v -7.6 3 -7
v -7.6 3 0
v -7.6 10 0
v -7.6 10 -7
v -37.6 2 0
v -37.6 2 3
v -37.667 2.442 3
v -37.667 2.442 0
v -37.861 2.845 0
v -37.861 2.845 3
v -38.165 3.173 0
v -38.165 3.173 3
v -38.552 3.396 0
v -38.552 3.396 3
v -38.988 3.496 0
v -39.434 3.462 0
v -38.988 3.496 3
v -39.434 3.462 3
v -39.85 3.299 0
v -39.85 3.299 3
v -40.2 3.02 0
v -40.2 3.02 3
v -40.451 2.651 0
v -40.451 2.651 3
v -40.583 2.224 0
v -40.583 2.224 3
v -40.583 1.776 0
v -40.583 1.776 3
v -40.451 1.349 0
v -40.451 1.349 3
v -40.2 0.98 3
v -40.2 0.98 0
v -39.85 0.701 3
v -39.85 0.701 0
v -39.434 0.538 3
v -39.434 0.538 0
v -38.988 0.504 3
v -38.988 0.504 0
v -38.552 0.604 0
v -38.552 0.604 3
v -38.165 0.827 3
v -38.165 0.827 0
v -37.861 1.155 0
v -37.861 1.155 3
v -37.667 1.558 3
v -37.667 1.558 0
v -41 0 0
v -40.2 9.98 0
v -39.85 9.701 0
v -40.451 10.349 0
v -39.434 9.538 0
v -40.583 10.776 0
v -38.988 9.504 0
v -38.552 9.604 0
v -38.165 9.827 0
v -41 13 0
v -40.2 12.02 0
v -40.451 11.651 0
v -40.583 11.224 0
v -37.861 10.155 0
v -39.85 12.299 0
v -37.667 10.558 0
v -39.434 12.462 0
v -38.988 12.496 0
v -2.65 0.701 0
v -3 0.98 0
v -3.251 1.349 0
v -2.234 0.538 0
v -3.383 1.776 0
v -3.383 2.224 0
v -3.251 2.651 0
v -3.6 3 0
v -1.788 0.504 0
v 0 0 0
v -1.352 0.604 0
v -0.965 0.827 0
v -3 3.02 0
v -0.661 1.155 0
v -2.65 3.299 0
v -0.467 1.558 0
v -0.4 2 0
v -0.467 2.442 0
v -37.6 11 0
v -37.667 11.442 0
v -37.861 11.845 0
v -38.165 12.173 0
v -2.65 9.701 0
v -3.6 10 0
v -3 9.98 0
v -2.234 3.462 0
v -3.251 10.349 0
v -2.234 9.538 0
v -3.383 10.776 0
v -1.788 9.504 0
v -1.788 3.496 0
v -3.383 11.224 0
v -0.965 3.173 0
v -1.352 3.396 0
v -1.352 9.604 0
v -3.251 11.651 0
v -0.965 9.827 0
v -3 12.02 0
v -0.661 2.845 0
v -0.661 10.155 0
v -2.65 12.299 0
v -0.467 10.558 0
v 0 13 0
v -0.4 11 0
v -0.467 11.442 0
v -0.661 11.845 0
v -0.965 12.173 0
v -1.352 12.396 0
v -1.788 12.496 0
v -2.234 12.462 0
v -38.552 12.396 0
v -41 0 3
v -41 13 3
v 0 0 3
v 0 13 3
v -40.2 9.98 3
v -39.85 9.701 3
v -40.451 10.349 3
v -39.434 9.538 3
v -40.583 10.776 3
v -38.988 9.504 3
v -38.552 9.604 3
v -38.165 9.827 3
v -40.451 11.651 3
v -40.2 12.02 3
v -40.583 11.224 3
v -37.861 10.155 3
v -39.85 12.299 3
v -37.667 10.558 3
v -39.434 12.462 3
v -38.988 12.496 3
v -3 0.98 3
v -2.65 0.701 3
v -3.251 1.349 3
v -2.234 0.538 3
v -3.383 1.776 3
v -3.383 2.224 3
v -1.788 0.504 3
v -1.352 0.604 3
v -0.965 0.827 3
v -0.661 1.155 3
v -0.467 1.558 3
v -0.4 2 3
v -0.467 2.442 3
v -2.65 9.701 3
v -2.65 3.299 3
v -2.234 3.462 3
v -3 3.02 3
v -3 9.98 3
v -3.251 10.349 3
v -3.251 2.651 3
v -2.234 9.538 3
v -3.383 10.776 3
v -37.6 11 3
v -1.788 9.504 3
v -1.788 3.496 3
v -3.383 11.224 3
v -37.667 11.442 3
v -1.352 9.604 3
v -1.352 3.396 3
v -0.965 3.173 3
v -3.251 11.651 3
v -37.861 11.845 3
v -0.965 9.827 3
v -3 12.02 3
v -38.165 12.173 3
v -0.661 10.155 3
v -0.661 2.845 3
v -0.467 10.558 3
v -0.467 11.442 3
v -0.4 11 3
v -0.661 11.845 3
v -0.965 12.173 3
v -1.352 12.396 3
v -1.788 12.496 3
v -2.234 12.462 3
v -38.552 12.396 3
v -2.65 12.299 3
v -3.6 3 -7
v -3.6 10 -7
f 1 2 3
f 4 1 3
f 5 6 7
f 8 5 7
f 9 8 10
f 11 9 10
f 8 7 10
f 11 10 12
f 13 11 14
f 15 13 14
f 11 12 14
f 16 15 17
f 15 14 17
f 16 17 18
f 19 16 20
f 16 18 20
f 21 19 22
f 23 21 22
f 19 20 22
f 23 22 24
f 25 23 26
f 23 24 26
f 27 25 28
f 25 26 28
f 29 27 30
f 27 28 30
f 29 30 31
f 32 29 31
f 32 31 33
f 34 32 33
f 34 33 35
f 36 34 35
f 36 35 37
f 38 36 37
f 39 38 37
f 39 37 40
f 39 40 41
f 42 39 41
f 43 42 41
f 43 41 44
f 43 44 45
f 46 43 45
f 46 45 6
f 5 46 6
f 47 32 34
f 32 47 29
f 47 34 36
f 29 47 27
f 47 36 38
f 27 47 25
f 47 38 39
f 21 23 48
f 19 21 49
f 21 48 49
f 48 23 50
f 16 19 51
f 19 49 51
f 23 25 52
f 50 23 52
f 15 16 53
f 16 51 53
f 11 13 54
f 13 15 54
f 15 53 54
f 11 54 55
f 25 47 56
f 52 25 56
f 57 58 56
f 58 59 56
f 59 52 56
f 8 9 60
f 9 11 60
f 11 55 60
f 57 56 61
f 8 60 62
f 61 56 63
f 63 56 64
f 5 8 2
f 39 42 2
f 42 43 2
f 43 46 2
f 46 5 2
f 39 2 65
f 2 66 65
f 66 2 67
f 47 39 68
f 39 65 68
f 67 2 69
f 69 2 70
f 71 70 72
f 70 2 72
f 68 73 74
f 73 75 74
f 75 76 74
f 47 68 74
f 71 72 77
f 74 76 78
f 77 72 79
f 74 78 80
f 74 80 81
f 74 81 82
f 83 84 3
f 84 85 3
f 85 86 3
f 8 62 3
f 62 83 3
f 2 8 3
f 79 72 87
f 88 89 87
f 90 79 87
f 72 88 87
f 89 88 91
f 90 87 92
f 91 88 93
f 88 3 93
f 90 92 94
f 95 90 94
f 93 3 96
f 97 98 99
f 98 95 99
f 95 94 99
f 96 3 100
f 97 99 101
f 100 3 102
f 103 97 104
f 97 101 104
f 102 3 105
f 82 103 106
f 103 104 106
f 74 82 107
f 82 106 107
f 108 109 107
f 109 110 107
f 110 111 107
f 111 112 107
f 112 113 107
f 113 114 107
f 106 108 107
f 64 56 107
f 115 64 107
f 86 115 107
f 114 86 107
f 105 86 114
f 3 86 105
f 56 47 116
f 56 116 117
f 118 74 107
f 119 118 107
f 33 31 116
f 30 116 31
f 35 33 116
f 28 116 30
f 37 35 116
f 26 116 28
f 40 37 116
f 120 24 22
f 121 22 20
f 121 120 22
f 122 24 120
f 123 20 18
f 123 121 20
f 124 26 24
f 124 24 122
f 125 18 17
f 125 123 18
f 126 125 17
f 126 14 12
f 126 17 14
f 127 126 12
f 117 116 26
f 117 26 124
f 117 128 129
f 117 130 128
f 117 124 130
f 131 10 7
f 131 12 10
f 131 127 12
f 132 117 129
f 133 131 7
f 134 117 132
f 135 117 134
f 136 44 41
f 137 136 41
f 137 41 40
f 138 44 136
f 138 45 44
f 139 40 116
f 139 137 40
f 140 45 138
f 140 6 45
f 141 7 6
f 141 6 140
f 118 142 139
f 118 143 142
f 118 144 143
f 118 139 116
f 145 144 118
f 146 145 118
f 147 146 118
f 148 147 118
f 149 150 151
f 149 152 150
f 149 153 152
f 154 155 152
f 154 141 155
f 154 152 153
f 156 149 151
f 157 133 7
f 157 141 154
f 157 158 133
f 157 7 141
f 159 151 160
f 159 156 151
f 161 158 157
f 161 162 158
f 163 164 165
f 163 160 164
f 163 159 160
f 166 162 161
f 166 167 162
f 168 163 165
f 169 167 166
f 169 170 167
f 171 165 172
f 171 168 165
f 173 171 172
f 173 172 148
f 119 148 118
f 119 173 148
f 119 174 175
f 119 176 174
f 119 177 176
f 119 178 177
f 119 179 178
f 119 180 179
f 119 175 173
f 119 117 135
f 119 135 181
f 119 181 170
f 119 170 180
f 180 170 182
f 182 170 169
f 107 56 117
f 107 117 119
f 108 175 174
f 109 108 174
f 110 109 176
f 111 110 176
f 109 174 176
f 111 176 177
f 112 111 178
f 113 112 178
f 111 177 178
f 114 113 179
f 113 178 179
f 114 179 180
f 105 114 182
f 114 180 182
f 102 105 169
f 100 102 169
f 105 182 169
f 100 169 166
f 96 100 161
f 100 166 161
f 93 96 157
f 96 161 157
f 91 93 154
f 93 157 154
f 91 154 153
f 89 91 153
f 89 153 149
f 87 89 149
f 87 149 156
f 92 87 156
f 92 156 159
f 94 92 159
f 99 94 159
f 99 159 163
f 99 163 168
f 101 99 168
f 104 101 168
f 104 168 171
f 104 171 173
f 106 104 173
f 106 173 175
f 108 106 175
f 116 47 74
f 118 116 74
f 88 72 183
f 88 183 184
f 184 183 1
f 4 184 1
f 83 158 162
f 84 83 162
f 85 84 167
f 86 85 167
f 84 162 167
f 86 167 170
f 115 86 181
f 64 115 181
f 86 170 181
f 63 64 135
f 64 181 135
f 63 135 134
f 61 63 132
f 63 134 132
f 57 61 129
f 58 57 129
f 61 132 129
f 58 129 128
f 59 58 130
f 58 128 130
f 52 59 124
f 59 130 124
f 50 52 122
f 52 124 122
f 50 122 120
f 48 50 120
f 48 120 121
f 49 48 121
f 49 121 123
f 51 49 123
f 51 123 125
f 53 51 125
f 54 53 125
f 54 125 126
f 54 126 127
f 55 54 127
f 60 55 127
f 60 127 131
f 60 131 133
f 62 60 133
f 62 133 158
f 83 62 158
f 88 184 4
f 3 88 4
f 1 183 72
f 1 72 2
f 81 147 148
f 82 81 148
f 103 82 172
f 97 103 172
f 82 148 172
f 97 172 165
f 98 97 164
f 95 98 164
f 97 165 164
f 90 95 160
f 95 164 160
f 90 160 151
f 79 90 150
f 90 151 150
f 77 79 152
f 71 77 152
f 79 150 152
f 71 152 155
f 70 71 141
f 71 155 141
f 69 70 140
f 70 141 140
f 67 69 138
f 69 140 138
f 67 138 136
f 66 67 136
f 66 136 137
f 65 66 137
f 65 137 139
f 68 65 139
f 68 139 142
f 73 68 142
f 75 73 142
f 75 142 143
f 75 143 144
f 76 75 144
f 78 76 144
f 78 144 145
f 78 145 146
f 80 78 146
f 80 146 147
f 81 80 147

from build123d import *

# Parameters (mm, degrees)
CROQUIS1_W              = 41
CROQUIS1_H              = 13
SALIENTE_EXTRUIR1_DEPTH = 3
CROQUIS2_R              = 1.5
CORTAR_EXTRUIR1_DEPTH   = 44.116122275
CROQUIS3_W              = 4
CROQUIS3_H              = 7
SALIENTE_EXTRUIR2_DEPTH = 7


with BuildPart() as part:
    # Croquis1 → Saliente-Extruir1 (new body)
    with BuildSketch(Plane.XY):
        with Locations((-20.5, 6.5)):
            Rectangle(CROQUIS1_W, CROQUIS1_H)
    extrude(amount=SALIENTE_EXTRUIR1_DEPTH)

    # Croquis2 → Cortar-Extruir1 (cut, through all)
    with BuildSketch(Plane.XY.offset(3)):
        with Locations((-1.9, 11)):
            Circle(CROQUIS2_R)
        with Locations((-1.9, 2)):
            Circle(CROQUIS2_R)
        with Locations((-39.1, 11)):
            Circle(CROQUIS2_R)
        with Locations((-39.1, 2)):
            Circle(CROQUIS2_R)
    extrude(amount=-CORTAR_EXTRUIR1_DEPTH, mode=Mode.SUBTRACT)

    # Croquis3 → Saliente-Extruir2 (add)
    with BuildSketch(Plane(origin=(0, 0, 0), x_dir=(-1, 0, 0), z_dir=(0, 0, -1))):
        with Locations((5.6, 6.5)):
            Rectangle(CROQUIS3_W, CROQUIS3_H)
    extrude(amount=SALIENTE_EXTRUIR2_DEPTH)


solid = part.part
